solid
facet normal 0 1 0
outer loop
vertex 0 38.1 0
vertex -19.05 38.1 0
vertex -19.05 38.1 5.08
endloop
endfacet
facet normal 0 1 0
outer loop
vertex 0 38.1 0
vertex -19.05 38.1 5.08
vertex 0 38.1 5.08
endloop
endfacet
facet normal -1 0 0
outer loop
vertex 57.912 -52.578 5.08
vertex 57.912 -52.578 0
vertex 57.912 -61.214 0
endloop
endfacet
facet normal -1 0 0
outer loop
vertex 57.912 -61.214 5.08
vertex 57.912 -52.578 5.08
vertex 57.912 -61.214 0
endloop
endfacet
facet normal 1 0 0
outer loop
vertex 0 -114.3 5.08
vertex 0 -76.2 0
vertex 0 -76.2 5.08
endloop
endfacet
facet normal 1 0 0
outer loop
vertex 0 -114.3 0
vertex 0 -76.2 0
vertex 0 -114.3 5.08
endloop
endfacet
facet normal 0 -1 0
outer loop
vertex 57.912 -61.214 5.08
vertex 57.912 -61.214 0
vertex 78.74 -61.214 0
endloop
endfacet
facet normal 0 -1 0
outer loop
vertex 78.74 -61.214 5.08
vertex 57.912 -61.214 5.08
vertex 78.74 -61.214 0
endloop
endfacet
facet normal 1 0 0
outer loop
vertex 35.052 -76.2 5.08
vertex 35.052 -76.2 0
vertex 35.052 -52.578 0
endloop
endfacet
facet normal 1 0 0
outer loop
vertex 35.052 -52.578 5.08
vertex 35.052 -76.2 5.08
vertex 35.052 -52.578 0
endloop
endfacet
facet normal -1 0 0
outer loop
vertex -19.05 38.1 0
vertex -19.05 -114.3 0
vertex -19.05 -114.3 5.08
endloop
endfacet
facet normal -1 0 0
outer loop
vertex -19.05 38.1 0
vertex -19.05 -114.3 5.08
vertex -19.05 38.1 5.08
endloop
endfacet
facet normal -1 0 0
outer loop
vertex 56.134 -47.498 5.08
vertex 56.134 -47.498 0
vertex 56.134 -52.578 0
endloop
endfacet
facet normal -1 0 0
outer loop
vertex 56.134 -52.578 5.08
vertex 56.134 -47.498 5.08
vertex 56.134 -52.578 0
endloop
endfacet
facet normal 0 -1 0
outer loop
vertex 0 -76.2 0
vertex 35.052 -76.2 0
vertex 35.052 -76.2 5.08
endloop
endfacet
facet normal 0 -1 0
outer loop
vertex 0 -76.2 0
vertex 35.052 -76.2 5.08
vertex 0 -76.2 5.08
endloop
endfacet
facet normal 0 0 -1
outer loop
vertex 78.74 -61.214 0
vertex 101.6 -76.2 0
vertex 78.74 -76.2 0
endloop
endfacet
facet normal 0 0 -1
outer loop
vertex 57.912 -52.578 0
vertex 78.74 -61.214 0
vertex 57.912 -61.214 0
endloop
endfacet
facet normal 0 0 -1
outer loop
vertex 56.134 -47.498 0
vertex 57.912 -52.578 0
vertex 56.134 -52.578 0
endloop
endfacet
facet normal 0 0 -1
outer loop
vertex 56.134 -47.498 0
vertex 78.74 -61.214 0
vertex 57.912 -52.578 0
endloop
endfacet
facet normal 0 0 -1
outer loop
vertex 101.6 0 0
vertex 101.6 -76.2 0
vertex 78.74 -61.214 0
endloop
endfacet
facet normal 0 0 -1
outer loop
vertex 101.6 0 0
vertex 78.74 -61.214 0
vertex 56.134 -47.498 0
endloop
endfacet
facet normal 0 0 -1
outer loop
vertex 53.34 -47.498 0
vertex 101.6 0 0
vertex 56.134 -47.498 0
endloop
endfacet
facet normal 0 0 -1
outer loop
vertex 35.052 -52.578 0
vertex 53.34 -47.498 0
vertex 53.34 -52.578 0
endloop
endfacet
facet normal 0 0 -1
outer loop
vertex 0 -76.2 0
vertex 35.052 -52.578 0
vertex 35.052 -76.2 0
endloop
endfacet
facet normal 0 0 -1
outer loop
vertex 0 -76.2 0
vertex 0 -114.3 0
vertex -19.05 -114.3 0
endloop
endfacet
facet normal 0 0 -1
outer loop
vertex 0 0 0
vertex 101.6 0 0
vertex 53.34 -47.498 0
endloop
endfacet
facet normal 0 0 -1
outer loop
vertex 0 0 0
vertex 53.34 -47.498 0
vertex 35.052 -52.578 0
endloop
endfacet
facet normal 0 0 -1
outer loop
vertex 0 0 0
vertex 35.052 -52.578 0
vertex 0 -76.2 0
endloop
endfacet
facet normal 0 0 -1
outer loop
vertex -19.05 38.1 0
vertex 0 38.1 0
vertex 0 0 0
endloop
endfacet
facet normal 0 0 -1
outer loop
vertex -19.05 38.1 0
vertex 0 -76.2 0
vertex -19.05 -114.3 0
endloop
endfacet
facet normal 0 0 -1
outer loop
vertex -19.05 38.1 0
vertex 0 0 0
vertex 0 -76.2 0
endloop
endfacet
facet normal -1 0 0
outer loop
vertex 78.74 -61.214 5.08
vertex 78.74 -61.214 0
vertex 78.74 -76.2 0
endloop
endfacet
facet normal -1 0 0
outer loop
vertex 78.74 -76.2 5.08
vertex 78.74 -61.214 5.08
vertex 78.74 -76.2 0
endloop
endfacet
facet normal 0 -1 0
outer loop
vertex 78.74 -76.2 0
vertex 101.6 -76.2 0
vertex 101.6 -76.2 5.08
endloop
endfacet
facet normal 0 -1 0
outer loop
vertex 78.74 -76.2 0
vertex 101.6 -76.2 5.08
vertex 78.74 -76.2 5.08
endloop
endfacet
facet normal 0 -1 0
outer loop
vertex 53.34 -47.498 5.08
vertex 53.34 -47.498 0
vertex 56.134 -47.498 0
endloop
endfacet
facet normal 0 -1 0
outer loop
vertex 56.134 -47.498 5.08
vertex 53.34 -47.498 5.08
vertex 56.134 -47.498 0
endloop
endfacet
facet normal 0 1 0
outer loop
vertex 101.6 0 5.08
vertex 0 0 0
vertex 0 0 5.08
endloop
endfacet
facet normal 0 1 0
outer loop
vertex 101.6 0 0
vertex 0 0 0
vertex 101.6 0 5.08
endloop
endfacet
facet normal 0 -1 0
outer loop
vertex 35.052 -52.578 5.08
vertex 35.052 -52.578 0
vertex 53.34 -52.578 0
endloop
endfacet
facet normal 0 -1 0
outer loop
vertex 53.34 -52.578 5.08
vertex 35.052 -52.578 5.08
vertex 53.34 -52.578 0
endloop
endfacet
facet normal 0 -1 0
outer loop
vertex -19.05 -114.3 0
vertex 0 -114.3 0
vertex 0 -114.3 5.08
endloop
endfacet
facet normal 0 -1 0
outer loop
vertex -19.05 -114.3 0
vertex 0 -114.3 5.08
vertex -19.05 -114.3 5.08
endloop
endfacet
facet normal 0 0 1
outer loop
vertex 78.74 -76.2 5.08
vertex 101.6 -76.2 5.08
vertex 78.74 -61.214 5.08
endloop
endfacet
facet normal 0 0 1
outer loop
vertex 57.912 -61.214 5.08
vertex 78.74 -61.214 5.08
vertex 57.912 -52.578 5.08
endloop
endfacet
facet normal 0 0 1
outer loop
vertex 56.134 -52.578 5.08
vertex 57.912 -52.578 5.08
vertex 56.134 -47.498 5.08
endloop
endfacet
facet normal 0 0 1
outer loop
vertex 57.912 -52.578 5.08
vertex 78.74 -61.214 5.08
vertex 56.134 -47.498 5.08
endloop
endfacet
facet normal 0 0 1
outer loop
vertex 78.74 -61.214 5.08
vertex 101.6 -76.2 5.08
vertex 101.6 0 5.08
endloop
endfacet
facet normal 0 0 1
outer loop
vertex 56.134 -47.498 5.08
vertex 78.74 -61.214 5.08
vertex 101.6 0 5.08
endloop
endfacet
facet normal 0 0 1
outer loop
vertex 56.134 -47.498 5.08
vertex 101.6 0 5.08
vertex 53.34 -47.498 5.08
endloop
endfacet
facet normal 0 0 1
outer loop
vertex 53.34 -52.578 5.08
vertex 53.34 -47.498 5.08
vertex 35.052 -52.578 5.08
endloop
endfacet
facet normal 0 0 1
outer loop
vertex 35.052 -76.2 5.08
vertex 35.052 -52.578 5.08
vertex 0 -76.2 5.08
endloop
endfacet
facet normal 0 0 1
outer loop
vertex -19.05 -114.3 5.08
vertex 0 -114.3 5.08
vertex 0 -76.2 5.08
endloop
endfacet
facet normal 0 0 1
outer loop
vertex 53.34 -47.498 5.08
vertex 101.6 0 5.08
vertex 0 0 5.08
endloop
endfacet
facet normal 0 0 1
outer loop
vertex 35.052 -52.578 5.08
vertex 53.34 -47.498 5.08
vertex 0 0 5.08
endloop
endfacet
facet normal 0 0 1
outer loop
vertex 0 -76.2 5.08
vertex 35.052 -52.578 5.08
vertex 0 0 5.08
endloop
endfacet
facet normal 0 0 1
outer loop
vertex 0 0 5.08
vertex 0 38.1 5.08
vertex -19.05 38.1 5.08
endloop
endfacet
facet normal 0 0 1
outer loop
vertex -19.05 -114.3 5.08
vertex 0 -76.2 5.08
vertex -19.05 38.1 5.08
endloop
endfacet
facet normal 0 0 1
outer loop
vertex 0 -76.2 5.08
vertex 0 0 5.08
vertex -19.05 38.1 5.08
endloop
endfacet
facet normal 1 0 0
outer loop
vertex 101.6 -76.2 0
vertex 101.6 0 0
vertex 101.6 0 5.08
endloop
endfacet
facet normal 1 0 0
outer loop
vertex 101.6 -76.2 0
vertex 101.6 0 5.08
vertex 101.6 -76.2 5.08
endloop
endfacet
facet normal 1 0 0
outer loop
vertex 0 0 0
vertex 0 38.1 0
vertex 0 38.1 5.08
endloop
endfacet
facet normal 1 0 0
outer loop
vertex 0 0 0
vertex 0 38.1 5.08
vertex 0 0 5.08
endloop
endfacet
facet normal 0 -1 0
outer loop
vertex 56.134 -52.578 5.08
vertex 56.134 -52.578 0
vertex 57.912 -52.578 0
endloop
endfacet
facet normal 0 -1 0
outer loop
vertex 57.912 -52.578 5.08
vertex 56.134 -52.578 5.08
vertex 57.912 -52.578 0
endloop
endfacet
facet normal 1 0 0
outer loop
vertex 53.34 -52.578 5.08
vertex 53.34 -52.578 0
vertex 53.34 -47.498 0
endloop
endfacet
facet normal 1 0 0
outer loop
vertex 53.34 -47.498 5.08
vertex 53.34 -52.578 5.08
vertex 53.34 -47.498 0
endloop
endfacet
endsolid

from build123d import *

# Parameters (mm, degrees)
BOSS_EXTRUDE1_DEPTH     = 5.08
CUT_EXTRUDE1_DEPTH      = 154.012602095
CUT_EXTRUDE1_DEPTH_BACK = 154.012602095


with BuildPart() as part:
    # Sketch1 → Boss-Extrude1 (new body)
    with BuildSketch(Plane.XY):
        Polygon((0, 0), (101.6, 0), (101.6, -76.2), (0, -76.2), (0, -114.3), (-19.05, -114.3), (-19.05, 38.1), (0, 38.1), align=None)
    extrude(amount=BOSS_EXTRUDE1_DEPTH)

    # Sketch2 → Cut-Extrude1 (cut, two sides: drawn at the far end of the back side and taken through both)
    with BuildSketch(Plane.XY.offset(5.08).offset(-CUT_EXTRUDE1_DEPTH_BACK)):
        Polygon((35.052, -76.2), (35.052, -52.578), (53.34, -52.578), (53.34, -47.498), (56.134, -47.498), (56.134, -52.578), (57.912, -52.578), (57.912, -61.214), (78.74, -61.214), (78.74, -76.2), align=None)
    extrude(amount=CUT_EXTRUDE1_DEPTH + CUT_EXTRUDE1_DEPTH_BACK, mode=Mode.SUBTRACT)


solid = part.part
